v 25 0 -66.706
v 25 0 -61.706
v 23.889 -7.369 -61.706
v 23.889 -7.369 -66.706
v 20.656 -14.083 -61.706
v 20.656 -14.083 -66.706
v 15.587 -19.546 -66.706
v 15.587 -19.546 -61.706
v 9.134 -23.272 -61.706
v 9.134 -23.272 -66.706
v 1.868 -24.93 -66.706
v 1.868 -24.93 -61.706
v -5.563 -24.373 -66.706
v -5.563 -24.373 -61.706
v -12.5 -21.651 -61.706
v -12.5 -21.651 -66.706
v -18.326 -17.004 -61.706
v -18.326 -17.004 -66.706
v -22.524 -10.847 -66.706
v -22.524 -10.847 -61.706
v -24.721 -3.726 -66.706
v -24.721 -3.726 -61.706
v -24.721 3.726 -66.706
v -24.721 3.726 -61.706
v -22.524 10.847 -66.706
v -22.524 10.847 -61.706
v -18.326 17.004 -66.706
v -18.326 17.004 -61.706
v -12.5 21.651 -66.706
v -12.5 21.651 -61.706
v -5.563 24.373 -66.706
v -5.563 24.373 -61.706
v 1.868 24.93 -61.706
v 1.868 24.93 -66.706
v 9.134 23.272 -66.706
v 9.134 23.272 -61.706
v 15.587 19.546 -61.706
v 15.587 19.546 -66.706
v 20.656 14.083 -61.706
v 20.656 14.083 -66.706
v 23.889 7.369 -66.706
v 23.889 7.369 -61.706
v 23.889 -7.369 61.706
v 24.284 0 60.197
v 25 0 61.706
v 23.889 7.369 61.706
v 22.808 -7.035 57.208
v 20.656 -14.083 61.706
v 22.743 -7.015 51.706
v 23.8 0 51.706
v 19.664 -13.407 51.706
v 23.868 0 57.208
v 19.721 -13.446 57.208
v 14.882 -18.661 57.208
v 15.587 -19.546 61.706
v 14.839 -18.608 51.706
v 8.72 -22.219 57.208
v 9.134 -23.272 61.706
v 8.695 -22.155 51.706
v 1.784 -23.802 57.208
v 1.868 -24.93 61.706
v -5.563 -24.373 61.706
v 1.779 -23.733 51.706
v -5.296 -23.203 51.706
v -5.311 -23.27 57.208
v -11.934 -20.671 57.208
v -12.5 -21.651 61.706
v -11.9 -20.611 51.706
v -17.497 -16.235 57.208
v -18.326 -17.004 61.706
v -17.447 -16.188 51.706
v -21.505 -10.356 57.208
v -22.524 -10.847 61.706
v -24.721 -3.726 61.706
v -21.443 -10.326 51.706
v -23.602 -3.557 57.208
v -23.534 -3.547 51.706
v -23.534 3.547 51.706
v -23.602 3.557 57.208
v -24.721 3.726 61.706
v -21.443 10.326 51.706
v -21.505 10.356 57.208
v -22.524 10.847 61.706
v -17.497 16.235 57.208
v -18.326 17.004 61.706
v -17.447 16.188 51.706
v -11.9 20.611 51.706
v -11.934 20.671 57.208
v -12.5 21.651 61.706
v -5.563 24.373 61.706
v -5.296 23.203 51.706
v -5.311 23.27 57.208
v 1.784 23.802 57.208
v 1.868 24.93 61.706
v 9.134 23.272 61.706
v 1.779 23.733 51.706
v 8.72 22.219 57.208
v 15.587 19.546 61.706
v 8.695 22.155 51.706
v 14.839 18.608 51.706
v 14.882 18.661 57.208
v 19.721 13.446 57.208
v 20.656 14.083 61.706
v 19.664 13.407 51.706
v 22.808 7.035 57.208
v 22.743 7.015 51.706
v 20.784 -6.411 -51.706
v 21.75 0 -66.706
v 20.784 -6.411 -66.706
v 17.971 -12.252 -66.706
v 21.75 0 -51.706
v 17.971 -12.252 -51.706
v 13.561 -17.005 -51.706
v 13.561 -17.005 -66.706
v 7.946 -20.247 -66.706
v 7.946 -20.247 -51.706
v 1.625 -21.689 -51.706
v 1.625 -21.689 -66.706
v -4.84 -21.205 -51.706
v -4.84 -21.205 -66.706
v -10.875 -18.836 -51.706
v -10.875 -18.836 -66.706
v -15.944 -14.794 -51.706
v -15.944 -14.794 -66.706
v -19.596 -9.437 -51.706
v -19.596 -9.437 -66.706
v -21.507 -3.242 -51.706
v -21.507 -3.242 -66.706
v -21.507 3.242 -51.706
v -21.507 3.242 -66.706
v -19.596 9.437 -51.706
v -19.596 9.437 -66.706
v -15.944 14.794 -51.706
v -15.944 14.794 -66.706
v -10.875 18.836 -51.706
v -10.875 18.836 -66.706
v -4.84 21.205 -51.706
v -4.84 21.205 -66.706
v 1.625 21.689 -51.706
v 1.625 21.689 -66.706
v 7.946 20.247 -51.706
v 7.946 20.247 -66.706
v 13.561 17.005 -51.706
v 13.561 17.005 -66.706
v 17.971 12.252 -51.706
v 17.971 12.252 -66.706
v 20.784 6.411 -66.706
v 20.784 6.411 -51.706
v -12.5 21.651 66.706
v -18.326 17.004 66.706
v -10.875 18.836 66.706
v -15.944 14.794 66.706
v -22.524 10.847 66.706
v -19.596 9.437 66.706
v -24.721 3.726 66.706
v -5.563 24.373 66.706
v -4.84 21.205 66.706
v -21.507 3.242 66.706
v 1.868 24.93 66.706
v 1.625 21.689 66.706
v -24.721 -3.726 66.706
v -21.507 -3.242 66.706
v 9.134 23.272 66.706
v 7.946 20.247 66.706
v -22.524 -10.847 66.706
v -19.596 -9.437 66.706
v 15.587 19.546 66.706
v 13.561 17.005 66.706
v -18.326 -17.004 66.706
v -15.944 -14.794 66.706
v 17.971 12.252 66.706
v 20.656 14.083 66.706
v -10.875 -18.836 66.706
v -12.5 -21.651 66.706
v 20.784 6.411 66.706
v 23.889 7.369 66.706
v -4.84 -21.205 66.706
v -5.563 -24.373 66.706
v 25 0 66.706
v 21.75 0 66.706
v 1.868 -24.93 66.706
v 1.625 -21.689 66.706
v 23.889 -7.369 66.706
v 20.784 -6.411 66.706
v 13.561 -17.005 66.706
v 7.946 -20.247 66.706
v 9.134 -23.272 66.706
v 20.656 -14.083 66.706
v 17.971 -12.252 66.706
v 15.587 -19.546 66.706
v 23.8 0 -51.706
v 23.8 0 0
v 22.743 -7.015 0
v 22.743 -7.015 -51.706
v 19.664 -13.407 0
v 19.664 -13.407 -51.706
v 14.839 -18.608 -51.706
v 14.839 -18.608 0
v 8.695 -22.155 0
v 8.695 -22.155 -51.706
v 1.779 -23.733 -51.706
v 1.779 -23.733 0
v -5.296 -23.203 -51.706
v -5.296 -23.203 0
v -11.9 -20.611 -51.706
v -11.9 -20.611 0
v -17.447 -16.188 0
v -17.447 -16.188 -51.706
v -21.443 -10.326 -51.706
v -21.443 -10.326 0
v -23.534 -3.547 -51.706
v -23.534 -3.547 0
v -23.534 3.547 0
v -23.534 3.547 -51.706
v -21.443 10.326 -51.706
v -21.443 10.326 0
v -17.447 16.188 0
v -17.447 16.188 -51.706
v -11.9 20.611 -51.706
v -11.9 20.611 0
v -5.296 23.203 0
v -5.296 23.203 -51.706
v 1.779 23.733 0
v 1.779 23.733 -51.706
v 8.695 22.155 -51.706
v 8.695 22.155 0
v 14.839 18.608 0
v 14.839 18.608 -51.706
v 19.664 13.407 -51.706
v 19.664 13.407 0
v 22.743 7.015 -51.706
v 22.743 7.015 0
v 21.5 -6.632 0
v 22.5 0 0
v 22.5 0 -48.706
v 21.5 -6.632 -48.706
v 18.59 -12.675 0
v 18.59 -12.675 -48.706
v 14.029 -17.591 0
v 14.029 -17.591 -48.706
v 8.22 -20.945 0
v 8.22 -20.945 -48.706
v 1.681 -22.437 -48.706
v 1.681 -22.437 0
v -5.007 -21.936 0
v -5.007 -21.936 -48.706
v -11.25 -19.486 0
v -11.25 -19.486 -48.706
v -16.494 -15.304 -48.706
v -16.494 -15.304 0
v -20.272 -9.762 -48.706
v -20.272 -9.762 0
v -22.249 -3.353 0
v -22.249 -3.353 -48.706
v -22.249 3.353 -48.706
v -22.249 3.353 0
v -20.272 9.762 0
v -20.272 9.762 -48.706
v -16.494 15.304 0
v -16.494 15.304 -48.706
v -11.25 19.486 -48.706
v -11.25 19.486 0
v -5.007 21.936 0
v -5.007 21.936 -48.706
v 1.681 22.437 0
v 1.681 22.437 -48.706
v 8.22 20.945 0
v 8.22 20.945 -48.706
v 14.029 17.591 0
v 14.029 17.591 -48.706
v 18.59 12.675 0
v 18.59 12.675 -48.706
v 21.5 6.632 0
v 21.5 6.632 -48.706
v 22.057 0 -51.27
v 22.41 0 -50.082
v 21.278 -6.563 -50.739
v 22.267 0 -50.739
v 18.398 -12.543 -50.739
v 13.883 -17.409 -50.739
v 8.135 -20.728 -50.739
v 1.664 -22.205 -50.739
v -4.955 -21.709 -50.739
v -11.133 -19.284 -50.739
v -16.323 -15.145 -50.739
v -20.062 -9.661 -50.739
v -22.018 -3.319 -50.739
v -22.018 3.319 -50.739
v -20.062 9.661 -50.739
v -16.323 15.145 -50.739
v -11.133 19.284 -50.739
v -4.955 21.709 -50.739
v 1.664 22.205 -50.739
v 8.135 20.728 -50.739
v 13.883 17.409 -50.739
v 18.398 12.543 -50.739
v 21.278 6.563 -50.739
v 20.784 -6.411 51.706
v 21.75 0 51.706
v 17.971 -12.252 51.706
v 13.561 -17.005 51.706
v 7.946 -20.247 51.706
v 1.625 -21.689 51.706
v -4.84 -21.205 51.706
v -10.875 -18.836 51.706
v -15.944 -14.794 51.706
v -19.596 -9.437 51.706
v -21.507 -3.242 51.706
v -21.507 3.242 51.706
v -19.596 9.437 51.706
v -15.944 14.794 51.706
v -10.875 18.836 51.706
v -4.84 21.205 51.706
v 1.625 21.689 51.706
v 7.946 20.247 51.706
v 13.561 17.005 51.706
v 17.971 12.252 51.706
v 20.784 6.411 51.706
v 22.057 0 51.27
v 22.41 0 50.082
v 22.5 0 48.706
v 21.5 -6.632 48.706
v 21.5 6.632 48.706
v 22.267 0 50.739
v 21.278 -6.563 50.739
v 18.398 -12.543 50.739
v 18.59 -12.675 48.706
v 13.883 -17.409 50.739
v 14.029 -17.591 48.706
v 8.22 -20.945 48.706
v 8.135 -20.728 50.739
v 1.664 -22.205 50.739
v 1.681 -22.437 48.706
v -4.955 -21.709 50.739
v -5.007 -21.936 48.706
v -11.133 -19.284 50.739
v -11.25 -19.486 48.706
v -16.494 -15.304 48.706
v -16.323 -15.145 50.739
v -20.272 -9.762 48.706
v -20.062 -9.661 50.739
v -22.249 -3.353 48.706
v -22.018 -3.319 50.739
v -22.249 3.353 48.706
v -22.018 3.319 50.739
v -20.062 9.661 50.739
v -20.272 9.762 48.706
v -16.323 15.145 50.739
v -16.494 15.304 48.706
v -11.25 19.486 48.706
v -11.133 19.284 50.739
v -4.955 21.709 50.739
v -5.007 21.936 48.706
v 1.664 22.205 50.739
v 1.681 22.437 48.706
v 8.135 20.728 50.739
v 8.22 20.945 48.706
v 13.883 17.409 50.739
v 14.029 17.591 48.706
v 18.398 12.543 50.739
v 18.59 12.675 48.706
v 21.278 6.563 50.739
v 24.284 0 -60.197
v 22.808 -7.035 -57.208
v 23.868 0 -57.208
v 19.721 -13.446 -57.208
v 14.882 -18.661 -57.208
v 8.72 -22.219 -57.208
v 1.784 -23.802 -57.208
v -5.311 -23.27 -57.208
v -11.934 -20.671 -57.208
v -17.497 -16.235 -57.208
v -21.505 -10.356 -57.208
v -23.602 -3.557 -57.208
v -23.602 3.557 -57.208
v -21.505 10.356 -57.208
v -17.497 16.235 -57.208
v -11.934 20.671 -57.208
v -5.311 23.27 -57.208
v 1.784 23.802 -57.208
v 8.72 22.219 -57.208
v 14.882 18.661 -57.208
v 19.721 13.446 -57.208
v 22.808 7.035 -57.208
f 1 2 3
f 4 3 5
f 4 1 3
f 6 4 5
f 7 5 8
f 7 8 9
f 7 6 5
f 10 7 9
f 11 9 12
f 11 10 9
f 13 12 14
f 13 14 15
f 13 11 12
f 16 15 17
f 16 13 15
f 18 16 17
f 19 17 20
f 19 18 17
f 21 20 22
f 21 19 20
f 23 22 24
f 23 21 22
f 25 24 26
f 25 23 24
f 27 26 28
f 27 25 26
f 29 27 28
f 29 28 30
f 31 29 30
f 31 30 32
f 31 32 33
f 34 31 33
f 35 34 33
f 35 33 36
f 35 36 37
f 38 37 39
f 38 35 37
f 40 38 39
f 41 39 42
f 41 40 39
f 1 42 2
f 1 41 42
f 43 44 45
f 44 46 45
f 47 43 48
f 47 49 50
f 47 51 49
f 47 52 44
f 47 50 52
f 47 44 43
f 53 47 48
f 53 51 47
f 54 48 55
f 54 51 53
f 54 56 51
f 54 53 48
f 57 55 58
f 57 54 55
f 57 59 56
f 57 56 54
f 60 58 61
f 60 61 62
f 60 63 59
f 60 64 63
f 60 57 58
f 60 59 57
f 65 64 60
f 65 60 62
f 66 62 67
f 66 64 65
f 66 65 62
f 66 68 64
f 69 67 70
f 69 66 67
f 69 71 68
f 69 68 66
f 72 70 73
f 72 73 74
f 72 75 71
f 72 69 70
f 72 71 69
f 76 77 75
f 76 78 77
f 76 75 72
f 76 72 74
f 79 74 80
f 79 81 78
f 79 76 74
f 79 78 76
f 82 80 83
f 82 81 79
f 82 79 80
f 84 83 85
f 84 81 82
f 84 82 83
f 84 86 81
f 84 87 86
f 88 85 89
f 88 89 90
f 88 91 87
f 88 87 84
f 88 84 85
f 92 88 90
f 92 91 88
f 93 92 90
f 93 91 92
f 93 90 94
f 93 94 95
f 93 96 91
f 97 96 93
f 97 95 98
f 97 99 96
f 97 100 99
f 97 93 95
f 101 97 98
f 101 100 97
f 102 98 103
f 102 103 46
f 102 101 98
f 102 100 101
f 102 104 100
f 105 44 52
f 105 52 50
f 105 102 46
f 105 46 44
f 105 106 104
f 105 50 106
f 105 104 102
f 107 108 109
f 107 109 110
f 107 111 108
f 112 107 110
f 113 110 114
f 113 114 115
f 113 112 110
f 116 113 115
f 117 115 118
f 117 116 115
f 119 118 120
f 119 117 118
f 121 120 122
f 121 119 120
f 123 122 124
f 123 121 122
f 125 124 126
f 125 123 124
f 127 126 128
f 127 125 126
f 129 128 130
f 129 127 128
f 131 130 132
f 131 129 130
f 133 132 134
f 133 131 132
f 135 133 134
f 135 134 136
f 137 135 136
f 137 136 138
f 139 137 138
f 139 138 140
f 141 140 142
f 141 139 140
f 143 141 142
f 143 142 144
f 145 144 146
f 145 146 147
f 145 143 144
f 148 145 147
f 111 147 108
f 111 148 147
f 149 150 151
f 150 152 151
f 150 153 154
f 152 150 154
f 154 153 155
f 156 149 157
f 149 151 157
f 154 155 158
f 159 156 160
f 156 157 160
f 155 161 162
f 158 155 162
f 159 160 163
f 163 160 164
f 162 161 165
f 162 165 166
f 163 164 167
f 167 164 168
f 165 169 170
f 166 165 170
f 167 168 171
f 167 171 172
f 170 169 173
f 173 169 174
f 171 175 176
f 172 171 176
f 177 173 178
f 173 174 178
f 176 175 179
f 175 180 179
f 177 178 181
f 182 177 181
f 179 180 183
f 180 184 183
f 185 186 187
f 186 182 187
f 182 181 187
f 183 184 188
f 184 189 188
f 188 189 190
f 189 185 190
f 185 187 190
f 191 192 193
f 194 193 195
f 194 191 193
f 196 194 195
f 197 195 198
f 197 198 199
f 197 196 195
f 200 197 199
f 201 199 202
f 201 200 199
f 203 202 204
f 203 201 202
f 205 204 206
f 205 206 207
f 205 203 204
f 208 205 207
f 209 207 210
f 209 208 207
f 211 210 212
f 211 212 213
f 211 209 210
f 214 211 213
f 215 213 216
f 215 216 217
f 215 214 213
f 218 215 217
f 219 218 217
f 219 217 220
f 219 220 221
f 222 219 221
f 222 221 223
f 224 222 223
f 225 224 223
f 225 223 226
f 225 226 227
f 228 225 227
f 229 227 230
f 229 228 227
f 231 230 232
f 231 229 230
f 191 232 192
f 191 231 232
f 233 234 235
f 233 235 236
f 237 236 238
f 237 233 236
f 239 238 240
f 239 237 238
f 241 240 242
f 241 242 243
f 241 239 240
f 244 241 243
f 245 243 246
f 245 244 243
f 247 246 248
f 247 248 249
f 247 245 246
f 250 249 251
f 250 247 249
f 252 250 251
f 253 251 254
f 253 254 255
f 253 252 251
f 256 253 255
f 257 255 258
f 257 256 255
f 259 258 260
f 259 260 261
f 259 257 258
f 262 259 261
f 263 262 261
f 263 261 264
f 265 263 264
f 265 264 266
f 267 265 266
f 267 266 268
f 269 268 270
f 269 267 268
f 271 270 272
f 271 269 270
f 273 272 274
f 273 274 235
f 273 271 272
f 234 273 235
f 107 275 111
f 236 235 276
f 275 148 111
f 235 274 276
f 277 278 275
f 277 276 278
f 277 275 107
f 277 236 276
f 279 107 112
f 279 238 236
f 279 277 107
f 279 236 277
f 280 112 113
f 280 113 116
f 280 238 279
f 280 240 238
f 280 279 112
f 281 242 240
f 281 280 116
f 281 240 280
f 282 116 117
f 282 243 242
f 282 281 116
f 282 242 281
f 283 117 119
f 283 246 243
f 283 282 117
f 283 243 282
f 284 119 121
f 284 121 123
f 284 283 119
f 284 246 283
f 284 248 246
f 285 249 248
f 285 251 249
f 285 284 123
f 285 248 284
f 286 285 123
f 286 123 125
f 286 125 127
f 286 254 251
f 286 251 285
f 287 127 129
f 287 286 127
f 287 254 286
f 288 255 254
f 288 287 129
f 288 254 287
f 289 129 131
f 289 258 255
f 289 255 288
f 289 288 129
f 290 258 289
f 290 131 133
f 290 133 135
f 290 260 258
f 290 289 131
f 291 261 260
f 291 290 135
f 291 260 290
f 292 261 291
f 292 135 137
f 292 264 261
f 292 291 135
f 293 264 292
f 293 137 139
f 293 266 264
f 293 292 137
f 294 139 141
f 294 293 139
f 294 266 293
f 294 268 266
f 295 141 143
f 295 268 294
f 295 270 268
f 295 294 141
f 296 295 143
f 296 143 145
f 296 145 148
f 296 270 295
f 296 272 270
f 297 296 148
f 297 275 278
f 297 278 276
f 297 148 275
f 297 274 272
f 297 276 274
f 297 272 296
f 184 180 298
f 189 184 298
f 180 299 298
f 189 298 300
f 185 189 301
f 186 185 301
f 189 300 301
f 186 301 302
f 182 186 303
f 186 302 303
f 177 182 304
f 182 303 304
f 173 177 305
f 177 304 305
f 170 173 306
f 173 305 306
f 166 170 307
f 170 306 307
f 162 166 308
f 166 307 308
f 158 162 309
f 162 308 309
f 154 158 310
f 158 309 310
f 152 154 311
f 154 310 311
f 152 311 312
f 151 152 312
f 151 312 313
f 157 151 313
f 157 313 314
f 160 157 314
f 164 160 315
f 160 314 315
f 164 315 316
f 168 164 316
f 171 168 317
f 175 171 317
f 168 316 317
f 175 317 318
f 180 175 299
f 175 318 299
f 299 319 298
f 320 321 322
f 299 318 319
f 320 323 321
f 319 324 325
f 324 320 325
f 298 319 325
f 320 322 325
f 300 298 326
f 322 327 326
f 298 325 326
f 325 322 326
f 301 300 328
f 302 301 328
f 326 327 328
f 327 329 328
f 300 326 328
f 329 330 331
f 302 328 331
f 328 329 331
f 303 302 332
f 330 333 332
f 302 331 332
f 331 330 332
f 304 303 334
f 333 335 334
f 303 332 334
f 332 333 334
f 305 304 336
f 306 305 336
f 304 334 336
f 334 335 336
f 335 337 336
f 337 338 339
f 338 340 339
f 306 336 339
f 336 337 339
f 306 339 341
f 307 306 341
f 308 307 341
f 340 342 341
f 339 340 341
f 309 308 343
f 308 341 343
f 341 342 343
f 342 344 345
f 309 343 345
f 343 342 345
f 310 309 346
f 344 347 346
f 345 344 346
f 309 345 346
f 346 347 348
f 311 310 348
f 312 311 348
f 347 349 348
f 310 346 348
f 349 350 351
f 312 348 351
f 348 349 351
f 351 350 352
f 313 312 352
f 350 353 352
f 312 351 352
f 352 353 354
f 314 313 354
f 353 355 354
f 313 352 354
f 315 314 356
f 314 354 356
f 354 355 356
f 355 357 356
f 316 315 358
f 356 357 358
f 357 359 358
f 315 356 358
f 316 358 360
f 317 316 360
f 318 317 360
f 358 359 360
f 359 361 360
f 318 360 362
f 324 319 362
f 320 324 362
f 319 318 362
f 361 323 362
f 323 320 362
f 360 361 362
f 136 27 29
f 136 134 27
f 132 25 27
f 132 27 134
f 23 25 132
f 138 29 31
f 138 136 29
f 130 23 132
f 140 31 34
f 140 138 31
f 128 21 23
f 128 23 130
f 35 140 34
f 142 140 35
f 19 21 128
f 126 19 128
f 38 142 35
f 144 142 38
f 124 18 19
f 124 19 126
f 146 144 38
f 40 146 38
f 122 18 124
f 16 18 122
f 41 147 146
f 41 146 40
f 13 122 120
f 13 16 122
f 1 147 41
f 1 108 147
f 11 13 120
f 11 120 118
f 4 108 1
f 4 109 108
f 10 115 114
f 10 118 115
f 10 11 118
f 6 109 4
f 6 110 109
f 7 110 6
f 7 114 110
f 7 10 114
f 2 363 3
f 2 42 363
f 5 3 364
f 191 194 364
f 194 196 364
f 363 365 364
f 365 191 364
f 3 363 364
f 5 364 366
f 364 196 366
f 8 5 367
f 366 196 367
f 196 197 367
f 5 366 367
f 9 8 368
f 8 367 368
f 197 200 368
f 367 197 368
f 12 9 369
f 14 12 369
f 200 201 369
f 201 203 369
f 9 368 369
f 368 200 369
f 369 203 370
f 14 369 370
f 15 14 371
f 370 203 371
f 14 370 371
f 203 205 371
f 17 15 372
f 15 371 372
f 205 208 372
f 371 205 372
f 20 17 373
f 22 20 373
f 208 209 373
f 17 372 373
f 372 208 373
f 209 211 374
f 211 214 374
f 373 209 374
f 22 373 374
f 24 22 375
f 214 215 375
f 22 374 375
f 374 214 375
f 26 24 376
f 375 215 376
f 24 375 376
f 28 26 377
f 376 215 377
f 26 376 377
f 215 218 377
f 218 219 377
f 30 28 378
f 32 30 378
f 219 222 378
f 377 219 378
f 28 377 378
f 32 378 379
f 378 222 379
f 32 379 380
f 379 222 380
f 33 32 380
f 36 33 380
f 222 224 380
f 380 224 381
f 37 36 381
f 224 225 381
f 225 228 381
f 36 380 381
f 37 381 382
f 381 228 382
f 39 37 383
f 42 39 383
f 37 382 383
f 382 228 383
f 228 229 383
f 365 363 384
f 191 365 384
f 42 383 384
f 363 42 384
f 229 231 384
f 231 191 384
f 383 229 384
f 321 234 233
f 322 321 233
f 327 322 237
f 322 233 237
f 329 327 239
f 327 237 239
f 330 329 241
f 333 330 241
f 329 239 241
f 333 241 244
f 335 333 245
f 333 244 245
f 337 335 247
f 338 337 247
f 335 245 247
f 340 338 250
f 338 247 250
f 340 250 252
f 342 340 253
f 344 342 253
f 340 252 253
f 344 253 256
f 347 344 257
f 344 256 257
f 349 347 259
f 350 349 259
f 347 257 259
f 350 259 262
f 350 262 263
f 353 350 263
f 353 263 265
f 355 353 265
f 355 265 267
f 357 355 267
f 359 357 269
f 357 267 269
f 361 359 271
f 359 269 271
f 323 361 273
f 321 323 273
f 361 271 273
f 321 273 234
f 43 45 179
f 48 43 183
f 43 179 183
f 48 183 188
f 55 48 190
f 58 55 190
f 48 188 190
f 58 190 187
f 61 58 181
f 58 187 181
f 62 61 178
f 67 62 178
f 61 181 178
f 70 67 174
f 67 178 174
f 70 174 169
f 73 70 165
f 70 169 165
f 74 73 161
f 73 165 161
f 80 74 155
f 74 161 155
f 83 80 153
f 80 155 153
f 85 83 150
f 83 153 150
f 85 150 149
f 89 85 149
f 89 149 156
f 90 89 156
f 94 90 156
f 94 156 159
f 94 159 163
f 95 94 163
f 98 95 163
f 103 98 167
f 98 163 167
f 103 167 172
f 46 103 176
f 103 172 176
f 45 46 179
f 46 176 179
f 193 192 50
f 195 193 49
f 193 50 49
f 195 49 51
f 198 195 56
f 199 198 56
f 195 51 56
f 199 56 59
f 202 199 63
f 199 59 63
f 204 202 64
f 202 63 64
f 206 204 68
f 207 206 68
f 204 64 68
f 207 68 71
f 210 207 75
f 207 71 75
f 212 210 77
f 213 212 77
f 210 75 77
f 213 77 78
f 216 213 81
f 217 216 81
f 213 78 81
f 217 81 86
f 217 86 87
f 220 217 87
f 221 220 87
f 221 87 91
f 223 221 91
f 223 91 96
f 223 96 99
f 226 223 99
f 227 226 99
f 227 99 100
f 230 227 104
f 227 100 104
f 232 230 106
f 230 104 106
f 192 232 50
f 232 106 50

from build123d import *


with BuildPart() as f1:
    # F0 (on Front) → F1 (revolve)
    with BuildSketch(Plane.XZ):
        with BuildLine():
            Line((25, 66.7063602807), (21.75, 66.7063602807))
            Line((21.75, 66.7063602807), (21.75, 51.7063602807))
            add(Edge.make_bspline(
                [(21.75, 51.7063602807), (22.356479466, 51.0745504571), (22.5, 49.8551437309), (22.5, 48.7063602807)],
                knots=[0, 0, 0, 0, 3.0923292192, 3.0923292192, 3.0923292192, 3.0923292192], degree=3))
            Line((22.5, 48.7063602807), (22.5, 0))
            Line((22.5, 0), (23.8, 0))
            Line((23.8, 0), (23.8, 51.7063602807))
            add(Edge.make_bspline(
                [(25, 61.7063602807), (23.8398276269, 59.9064195158), (23.8, 58.3514220487), (23.8, 51.7063602807)],
                knots=[0, 0, 0, 0, 10.0717426496, 10.0717426496, 10.0717426496, 10.0717426496], degree=3))
            Line((25, 61.7063602807), (25, 66.7063602807))
        make_face()
    revolve(axis=Axis((0, 0, 33.3531801404), (0, 0, -1)))

    # F2: F1 across face


with BuildPart() as f1_1:
    add(f1.part)
    add(f1.part.mirror(Plane(origin=(0, 0, 0), x_dir=(1, 0, 0), z_dir=(0, 0, -1))))


solid = f1_1.part
